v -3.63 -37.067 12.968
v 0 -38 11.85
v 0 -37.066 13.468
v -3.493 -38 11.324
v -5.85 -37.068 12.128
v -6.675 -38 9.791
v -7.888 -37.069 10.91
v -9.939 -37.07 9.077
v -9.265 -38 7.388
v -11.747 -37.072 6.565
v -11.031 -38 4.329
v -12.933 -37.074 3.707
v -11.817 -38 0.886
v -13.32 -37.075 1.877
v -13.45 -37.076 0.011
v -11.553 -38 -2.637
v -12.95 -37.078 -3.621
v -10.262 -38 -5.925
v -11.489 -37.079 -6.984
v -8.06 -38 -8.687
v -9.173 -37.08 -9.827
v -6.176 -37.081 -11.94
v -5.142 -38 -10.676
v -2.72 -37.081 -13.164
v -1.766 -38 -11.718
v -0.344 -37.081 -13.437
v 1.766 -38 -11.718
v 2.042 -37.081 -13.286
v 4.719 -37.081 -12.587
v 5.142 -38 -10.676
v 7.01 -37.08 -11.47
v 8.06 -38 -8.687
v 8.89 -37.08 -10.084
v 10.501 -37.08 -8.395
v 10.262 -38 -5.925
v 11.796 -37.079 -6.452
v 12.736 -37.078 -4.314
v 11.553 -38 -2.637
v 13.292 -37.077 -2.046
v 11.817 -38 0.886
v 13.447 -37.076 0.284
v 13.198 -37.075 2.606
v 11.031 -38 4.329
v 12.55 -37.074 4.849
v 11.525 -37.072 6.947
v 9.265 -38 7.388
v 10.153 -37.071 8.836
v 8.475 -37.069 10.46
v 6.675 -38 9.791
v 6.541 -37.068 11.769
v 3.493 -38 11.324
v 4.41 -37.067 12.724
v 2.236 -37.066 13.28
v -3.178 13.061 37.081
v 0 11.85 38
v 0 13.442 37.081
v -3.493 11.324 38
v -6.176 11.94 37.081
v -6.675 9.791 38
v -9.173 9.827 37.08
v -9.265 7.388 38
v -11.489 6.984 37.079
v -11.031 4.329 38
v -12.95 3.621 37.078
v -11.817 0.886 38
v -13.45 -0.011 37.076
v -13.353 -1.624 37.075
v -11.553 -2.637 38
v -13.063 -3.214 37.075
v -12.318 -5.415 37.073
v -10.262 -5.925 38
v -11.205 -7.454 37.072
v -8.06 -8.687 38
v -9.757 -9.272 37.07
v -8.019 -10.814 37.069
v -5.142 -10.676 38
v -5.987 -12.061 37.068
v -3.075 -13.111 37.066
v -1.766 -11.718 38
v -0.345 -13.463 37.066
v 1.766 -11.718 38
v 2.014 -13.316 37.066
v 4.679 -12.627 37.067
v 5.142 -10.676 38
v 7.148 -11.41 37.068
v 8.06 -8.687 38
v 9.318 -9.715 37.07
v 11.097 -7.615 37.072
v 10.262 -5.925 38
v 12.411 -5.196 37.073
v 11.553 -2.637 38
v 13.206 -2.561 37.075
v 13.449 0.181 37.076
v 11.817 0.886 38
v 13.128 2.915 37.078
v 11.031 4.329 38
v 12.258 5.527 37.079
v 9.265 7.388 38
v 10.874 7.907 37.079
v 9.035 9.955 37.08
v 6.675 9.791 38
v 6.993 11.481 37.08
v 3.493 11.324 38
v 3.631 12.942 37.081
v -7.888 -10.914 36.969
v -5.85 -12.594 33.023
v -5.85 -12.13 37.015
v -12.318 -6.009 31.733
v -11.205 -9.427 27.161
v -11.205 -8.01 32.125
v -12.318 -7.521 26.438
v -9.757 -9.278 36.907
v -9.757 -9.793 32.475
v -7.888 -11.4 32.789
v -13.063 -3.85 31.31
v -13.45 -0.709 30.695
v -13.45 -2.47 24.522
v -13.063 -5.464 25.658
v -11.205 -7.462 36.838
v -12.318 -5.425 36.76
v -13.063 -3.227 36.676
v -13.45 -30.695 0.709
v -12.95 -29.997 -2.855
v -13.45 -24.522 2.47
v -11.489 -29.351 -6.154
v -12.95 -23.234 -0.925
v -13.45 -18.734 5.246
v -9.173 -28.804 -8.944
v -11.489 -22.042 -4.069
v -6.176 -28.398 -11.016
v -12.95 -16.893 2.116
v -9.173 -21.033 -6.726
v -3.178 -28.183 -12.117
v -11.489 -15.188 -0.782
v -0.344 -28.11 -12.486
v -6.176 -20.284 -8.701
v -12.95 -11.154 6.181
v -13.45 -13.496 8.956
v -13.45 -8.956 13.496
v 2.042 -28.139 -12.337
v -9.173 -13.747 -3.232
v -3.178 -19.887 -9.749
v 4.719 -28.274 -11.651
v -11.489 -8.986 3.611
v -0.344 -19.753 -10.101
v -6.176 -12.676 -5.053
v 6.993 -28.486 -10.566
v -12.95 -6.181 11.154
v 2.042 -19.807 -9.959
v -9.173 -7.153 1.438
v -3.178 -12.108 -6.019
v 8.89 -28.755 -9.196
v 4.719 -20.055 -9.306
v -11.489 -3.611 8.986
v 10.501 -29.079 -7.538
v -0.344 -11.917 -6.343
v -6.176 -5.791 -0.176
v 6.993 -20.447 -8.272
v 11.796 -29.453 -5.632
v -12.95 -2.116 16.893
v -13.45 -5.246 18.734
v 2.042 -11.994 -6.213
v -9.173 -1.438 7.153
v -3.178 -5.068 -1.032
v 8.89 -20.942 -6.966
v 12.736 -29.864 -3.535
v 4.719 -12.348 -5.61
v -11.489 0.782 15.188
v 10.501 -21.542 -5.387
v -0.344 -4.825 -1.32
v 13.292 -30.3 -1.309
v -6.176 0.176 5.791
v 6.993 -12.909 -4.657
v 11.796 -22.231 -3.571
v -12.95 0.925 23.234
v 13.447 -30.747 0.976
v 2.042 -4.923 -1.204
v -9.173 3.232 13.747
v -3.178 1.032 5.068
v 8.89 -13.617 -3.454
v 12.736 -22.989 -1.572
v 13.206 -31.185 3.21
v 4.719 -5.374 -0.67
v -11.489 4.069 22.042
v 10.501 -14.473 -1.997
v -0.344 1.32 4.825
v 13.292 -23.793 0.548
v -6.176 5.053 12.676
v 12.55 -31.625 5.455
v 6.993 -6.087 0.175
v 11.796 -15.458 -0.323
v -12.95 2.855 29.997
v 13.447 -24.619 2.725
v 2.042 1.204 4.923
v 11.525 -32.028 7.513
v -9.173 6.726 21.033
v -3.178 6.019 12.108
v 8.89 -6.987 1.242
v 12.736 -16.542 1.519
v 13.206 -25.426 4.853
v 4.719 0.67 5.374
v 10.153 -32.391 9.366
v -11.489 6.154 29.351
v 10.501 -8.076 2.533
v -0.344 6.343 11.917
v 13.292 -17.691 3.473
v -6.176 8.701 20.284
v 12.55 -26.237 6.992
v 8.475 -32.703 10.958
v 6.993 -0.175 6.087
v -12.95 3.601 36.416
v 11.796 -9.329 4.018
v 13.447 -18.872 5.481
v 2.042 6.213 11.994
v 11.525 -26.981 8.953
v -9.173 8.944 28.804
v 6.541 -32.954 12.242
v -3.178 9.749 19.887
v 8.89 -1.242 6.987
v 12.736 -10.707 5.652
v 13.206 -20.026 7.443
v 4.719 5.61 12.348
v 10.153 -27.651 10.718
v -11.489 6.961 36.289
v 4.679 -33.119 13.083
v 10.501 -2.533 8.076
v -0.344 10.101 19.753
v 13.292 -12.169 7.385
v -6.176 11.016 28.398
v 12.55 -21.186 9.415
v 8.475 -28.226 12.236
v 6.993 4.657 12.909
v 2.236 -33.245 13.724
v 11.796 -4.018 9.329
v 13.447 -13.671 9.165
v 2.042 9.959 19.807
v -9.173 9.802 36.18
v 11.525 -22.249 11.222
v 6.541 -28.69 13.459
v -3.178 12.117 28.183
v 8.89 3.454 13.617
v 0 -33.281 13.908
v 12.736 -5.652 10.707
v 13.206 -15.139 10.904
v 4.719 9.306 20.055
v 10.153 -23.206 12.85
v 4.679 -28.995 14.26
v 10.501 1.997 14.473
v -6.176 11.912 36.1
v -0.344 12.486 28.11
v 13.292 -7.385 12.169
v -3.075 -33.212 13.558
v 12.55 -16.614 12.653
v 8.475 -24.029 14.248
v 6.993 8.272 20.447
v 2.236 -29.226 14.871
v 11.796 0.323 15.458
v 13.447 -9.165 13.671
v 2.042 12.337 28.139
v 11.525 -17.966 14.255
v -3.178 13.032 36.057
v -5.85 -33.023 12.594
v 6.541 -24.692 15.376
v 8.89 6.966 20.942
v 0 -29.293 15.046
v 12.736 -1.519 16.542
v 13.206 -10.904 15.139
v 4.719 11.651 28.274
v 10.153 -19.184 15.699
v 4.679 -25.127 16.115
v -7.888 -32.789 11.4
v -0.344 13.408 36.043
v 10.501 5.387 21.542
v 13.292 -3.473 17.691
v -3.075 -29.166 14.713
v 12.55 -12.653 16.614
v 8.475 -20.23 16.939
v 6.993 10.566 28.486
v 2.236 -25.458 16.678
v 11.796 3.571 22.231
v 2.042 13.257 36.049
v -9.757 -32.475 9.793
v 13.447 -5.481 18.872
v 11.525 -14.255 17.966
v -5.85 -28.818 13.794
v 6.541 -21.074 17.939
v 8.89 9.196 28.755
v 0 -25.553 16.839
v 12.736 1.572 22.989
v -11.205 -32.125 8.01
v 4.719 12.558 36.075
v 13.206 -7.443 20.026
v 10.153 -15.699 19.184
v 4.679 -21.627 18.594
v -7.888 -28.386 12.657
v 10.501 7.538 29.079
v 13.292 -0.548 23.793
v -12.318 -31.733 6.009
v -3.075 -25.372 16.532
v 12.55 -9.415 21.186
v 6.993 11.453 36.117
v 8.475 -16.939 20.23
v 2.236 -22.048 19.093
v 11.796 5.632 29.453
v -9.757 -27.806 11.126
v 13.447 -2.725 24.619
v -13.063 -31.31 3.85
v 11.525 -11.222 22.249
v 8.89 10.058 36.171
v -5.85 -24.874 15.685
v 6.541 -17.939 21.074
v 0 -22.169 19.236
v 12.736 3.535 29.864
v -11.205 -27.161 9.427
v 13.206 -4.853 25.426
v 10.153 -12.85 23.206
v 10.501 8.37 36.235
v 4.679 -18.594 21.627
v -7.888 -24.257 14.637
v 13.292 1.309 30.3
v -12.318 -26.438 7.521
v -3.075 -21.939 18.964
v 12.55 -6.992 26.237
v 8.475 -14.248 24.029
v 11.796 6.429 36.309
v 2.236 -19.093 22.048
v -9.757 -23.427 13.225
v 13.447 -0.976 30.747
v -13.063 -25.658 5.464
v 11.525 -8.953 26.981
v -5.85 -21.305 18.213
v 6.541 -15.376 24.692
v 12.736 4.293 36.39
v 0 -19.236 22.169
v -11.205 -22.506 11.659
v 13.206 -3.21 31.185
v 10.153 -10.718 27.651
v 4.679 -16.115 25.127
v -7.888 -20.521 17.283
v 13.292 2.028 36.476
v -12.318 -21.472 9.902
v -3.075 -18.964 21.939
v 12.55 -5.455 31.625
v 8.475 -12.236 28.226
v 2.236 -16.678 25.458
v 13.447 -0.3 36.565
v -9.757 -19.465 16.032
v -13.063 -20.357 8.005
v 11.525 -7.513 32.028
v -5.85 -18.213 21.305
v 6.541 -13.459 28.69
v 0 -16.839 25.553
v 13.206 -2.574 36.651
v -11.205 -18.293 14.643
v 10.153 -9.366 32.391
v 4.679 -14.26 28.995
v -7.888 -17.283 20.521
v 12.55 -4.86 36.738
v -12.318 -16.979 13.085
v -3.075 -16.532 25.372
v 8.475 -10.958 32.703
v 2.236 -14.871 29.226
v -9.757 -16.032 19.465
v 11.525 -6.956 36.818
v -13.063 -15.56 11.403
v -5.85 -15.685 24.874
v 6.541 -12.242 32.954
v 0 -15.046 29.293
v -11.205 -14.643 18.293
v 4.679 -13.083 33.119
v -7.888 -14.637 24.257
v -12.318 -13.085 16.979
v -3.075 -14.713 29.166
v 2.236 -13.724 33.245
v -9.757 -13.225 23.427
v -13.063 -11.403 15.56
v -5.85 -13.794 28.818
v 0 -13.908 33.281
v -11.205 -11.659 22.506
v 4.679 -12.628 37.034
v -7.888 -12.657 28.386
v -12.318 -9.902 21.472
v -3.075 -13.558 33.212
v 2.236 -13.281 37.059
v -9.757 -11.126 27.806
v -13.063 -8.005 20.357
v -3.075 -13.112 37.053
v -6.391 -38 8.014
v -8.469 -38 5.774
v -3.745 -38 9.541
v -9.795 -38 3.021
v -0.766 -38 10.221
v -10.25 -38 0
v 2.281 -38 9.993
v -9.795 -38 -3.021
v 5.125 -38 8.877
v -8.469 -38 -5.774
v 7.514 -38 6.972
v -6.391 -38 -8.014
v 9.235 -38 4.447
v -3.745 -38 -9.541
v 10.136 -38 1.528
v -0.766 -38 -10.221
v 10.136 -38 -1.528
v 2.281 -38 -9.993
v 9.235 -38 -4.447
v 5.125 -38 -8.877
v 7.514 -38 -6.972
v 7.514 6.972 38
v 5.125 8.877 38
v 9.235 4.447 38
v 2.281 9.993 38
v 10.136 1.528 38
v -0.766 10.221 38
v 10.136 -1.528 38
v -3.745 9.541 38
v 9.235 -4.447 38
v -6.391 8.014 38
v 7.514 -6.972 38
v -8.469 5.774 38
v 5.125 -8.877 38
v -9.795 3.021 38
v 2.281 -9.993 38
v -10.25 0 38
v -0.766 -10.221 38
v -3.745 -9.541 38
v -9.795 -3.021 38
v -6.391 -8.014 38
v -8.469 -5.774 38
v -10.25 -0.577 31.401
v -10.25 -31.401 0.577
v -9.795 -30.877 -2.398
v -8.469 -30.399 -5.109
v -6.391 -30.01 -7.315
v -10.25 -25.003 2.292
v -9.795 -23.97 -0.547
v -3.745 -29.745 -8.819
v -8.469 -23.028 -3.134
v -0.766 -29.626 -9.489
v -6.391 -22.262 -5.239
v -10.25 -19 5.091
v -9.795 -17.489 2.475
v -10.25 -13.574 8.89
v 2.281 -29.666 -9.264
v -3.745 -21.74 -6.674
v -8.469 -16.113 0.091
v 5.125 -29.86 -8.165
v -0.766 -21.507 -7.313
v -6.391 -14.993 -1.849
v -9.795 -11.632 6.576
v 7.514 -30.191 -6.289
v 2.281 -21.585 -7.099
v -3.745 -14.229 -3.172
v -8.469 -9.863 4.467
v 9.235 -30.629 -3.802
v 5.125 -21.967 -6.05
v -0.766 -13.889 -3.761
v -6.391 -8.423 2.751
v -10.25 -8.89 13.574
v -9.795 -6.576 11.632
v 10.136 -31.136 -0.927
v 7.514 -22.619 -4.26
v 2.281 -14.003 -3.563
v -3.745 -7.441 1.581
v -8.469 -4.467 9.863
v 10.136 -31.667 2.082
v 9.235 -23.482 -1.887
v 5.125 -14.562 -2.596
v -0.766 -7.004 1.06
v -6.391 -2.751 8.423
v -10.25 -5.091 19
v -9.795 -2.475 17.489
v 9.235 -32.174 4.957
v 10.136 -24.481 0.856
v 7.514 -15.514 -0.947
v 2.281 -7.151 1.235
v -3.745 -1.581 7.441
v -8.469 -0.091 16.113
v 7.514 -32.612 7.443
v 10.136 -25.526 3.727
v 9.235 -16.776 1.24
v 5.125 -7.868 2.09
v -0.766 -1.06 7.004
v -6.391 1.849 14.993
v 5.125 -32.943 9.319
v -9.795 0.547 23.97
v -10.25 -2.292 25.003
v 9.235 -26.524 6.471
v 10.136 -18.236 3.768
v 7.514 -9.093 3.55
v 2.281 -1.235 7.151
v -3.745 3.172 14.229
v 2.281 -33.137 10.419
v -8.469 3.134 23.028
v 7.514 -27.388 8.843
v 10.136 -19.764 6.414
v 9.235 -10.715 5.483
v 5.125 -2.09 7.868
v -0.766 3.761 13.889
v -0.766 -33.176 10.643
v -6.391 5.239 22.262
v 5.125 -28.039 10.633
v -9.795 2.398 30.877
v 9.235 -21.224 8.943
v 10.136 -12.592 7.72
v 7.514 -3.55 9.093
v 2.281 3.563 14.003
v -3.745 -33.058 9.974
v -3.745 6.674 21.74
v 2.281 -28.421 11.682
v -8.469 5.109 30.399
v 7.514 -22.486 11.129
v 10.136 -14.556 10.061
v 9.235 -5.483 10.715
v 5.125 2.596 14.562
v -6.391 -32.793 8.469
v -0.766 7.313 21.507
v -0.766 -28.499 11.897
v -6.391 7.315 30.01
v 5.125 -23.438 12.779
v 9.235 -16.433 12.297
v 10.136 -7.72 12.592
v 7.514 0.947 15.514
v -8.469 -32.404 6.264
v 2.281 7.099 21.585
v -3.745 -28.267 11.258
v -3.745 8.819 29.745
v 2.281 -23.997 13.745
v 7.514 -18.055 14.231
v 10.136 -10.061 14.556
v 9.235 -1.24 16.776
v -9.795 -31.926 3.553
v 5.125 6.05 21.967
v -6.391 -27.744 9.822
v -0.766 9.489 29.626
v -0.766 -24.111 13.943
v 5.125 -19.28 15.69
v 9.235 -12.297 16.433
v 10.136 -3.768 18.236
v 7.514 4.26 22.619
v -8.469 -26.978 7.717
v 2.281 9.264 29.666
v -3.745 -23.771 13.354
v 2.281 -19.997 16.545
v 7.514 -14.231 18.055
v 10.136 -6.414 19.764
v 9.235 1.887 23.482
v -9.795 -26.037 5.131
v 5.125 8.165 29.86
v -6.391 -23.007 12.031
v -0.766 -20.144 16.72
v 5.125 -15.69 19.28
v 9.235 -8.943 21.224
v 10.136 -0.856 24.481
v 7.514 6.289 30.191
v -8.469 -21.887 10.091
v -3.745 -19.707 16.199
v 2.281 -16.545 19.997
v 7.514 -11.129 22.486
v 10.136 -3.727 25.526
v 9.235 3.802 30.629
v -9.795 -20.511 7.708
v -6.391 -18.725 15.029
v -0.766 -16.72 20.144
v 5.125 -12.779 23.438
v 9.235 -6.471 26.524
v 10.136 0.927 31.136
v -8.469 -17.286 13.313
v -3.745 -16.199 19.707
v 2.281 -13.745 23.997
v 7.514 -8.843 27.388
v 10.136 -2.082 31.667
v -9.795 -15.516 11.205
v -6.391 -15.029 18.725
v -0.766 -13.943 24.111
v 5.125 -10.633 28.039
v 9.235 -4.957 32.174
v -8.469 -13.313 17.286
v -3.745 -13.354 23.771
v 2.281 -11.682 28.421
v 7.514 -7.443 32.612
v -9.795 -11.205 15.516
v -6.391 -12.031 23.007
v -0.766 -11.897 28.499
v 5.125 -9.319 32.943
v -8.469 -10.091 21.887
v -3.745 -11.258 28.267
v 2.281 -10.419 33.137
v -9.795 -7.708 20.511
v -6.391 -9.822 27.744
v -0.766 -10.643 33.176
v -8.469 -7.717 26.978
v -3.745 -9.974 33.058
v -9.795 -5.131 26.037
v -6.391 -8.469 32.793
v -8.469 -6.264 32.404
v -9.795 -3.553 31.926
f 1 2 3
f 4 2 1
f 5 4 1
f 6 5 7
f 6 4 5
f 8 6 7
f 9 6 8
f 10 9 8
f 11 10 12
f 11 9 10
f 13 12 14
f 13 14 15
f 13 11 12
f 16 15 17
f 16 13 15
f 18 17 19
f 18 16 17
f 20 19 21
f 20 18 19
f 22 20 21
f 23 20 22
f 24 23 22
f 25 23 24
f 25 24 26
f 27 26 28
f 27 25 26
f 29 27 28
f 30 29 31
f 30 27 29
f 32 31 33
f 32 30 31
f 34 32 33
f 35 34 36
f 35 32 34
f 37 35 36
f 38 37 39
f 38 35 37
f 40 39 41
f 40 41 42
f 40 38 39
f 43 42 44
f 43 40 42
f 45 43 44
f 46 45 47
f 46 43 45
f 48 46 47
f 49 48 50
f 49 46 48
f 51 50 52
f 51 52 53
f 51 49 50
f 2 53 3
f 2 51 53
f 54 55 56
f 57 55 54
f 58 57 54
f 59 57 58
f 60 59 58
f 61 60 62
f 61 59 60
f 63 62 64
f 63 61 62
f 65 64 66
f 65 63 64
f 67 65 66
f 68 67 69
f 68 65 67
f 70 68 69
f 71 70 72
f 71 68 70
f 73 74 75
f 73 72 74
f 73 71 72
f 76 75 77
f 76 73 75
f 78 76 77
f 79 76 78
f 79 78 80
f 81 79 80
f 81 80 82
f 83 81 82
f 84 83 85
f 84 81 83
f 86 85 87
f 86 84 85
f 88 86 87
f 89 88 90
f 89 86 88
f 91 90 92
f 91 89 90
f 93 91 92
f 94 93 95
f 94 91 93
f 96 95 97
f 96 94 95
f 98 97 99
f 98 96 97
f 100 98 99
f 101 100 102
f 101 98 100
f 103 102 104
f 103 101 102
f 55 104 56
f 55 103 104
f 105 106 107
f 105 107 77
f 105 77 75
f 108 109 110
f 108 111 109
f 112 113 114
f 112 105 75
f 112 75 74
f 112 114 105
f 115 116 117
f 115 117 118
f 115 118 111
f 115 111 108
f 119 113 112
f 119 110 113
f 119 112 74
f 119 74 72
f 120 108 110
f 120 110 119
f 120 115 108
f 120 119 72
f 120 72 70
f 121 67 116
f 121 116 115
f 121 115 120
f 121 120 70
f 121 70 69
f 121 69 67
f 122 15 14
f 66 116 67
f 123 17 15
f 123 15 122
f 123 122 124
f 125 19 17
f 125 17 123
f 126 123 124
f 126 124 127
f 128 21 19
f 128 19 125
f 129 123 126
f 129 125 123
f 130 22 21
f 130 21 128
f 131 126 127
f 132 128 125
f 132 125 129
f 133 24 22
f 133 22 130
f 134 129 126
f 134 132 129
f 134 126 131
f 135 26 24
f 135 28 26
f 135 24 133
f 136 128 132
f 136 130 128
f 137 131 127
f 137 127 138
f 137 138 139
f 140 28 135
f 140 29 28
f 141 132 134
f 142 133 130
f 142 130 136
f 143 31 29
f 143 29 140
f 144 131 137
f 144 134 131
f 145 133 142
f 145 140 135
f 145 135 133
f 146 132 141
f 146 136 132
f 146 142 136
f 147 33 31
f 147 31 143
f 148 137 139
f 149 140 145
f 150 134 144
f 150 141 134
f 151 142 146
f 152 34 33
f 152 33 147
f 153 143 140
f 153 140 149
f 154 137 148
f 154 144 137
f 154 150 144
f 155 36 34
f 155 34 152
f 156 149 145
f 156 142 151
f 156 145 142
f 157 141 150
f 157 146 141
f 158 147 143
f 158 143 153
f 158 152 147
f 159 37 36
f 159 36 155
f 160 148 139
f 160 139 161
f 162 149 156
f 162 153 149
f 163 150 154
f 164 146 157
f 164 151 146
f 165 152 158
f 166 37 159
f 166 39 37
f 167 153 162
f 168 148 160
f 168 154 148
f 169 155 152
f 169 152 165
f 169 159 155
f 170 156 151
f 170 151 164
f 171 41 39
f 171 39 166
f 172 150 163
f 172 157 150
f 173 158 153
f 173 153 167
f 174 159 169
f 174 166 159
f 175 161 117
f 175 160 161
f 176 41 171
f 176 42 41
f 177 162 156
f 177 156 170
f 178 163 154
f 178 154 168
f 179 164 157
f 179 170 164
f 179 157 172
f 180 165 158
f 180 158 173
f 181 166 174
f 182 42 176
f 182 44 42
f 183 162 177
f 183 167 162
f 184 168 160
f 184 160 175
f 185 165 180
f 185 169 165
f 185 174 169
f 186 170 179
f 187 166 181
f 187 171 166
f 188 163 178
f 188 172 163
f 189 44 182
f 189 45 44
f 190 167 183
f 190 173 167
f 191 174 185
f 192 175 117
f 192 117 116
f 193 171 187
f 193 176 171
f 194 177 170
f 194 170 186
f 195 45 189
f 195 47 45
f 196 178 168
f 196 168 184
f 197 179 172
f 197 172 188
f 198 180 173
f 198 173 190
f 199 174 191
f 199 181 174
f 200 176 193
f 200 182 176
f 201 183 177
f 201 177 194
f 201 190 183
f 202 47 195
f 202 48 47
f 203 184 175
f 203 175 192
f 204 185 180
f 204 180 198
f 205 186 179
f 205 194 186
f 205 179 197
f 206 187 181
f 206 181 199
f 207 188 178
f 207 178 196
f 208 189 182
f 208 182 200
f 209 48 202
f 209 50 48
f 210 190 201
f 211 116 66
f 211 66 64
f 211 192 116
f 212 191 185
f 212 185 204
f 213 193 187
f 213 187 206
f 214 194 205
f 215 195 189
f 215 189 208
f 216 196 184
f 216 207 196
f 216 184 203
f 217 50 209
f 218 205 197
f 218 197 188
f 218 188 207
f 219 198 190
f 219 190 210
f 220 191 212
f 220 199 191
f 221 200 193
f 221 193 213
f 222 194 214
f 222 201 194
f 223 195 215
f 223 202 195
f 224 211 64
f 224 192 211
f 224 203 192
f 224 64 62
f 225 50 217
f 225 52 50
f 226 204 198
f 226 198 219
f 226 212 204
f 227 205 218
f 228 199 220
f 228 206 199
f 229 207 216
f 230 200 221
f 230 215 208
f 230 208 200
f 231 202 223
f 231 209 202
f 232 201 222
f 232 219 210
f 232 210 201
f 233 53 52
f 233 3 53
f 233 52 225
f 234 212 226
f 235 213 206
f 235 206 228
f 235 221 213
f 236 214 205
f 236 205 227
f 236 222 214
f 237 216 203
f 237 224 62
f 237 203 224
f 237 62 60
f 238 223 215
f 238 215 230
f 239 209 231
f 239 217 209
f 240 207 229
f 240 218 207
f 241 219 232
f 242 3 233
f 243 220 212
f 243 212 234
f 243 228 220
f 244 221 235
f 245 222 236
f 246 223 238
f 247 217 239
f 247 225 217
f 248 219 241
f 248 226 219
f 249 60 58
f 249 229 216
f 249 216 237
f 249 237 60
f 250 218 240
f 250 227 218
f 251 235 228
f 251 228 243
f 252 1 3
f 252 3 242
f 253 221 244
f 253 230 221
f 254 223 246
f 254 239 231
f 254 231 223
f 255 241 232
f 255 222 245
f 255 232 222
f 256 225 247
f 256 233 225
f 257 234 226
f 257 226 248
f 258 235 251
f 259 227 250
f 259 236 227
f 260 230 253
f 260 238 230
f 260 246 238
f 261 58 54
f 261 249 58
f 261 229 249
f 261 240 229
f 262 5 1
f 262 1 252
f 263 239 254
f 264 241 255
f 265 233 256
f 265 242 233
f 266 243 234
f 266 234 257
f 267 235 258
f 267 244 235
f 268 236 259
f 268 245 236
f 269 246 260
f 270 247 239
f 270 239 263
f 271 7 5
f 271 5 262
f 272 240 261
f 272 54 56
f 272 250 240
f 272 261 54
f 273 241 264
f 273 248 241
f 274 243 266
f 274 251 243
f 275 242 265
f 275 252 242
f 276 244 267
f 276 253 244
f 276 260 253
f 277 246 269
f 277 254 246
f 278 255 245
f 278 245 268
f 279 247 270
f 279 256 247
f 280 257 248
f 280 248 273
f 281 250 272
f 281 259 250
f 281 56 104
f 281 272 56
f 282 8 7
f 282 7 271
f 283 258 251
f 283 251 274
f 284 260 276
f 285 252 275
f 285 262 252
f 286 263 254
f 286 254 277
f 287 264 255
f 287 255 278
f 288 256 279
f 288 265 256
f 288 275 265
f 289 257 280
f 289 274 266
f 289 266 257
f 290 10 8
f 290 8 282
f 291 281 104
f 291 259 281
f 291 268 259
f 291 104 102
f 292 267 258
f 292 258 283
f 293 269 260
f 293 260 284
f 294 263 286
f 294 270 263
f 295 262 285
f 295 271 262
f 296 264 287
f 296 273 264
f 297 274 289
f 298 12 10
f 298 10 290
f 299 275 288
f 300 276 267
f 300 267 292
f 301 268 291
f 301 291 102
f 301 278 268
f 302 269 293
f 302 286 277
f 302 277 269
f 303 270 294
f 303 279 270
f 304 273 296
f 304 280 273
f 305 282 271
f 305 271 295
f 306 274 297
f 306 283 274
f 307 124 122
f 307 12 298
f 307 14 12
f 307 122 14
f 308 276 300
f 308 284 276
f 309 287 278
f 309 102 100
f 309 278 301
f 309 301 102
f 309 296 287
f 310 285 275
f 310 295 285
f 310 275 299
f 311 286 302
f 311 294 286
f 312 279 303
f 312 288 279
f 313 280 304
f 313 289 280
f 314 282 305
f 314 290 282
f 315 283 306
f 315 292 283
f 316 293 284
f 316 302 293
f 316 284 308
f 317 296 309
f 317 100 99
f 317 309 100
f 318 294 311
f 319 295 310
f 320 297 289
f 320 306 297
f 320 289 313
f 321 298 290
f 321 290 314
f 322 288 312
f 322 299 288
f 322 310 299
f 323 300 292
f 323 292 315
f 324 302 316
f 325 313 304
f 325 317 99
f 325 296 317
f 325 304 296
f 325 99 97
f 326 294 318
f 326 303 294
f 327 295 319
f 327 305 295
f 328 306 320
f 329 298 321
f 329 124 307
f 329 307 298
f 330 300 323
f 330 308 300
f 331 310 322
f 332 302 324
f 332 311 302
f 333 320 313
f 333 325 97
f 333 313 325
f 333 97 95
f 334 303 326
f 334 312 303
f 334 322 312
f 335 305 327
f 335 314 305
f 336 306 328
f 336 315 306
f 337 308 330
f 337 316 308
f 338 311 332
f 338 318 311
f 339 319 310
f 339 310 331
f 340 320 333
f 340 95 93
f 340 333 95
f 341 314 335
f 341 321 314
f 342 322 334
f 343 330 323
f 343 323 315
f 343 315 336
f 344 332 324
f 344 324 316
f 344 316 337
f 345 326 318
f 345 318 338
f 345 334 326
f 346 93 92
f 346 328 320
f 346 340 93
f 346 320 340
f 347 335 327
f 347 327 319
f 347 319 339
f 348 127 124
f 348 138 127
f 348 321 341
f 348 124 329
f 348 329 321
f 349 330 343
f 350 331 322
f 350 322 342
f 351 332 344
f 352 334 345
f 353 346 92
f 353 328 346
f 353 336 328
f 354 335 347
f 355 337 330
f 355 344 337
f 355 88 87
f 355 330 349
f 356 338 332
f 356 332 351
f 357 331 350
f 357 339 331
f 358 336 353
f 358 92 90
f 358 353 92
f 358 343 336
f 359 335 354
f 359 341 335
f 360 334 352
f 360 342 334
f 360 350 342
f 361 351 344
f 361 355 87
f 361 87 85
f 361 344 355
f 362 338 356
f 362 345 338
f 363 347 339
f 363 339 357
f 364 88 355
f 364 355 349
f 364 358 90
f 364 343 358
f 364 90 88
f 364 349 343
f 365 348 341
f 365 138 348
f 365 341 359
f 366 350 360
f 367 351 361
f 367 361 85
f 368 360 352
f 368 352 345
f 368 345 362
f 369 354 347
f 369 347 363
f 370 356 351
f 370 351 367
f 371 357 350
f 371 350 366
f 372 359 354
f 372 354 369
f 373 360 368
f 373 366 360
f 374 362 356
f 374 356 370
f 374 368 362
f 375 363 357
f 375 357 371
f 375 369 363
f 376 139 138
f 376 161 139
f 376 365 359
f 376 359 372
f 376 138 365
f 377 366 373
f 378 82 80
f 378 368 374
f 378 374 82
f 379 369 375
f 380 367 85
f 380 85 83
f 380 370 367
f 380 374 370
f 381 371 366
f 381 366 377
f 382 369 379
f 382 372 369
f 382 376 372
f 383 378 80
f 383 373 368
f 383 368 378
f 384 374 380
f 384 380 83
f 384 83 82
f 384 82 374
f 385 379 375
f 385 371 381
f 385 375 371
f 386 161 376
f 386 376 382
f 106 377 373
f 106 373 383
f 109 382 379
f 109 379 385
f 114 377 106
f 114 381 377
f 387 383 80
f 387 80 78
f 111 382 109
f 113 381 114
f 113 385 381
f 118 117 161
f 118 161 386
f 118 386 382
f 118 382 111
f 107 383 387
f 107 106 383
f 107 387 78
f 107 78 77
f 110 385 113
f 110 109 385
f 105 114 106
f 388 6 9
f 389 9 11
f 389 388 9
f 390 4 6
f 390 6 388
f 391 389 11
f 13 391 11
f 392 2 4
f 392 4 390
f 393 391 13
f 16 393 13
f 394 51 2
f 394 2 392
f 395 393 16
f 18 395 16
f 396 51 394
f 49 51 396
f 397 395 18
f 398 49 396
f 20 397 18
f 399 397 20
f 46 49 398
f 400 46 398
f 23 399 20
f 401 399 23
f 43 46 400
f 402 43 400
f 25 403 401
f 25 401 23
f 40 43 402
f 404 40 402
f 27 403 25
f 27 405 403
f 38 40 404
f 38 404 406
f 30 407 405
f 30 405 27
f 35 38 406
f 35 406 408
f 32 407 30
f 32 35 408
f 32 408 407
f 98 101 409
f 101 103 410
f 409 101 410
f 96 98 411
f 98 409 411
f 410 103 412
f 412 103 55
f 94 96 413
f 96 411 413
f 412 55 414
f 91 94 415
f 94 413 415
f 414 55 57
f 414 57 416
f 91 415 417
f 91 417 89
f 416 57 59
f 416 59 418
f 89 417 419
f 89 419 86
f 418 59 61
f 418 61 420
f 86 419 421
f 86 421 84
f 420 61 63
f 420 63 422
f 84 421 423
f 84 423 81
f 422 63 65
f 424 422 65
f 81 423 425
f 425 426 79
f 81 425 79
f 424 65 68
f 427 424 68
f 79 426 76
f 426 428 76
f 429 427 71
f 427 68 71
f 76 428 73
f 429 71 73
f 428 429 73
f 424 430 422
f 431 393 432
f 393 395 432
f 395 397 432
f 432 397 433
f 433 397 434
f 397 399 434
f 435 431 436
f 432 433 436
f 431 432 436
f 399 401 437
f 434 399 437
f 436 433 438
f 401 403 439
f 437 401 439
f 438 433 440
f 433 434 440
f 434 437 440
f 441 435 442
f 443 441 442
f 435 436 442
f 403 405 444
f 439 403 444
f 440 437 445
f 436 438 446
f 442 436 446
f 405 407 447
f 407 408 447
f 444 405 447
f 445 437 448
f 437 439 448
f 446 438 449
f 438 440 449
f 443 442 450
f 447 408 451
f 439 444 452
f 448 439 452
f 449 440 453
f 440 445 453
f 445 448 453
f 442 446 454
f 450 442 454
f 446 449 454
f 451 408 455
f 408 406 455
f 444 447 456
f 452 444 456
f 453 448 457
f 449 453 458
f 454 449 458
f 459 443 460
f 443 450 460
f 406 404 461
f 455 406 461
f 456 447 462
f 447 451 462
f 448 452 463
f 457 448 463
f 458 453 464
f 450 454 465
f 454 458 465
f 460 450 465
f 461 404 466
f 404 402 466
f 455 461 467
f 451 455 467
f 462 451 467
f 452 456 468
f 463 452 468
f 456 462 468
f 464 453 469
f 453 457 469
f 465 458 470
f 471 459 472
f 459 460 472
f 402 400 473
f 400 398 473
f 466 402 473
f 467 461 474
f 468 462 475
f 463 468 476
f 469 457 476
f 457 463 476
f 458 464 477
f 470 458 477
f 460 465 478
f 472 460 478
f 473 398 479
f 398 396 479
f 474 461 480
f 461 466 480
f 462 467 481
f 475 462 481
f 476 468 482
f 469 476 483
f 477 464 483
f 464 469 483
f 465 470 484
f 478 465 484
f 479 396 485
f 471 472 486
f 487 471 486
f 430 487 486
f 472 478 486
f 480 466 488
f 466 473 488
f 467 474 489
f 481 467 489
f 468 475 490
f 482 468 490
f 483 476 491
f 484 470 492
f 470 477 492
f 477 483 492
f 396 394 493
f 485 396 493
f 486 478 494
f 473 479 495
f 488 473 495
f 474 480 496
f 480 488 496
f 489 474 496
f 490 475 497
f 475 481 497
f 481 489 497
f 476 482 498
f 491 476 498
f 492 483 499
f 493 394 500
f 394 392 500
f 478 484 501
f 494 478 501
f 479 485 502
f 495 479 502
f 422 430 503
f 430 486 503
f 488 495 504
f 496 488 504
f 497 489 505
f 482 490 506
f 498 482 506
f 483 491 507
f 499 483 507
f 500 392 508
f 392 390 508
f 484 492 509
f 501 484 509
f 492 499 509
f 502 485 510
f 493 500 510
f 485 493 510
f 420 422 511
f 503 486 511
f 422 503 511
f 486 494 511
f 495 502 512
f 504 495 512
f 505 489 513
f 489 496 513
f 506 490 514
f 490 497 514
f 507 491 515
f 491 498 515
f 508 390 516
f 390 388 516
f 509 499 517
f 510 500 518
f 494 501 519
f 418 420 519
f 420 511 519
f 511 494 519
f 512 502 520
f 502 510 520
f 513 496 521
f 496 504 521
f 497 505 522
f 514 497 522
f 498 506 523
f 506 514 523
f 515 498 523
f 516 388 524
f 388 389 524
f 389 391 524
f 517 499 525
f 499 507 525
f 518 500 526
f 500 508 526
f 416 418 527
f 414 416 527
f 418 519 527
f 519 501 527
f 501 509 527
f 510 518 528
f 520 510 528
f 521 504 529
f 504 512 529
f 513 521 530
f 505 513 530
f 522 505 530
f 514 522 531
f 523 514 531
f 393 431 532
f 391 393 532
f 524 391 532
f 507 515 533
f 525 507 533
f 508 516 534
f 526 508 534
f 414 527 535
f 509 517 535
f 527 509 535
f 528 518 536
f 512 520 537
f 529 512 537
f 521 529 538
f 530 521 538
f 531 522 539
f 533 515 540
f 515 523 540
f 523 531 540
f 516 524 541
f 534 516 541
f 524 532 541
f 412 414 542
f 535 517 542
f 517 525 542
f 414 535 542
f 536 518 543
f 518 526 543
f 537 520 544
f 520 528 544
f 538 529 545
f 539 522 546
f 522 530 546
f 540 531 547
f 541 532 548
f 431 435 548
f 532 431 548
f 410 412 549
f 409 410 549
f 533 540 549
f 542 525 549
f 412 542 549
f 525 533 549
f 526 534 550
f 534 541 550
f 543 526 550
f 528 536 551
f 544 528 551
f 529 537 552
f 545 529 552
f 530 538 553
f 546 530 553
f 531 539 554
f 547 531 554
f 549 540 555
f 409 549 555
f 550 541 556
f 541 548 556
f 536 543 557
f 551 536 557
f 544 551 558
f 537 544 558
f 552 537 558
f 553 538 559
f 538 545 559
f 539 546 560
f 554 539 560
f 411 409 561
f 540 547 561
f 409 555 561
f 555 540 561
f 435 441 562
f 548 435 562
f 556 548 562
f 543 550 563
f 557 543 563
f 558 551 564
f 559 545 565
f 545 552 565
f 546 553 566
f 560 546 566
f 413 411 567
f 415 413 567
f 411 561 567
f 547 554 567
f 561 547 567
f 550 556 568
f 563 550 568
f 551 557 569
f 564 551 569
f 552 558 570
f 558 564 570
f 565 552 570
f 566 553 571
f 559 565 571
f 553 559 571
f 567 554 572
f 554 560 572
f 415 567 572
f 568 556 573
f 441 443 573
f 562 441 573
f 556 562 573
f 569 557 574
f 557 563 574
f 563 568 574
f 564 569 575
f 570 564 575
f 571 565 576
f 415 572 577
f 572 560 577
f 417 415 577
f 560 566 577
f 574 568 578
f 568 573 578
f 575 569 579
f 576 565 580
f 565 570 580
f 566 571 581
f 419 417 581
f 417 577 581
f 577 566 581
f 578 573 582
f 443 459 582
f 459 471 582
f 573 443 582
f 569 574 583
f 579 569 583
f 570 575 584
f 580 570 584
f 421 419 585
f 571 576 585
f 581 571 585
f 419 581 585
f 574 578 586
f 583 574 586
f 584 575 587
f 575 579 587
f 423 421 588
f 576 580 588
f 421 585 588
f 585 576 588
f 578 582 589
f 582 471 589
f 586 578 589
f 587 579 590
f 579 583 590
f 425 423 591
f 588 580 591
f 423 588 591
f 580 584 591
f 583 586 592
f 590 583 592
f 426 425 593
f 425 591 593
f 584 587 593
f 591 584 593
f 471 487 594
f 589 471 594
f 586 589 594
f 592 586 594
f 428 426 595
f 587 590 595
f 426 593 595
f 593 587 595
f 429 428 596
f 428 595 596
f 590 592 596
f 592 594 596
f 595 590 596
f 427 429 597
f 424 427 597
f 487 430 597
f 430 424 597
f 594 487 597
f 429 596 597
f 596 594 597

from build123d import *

# Parameters (mm, degrees)
ROHR_R   = 13.45
ROHR_R_2 = 10.25


with BuildPart() as part:
    # Bogen: sweep along a path in Pfad
    with BuildLine(Plane(origin=(0, 0, 0), x_dir=(0, 0, -1), z_dir=(1, 0, 0))) as bogen_path:
        ThreePointArc((0, -38), (-11.129942315, -11.129942315), (-38, 0))
    # Rohr → Bogen (sweep)
    with BuildSketch(Plane(origin=(0, -38, 0), x_dir=(-1, 0, 0), z_dir=(0, -1, 0))):
        Circle(ROHR_R)
        Circle(ROHR_R_2, mode=Mode.SUBTRACT)
    sweep(path=bogen_path.line)

    # SkzFase one side → Fase1 (revolve, cut)
    with BuildSketch(Plane(origin=(0, 0, 0), x_dir=(0, 0, -1), z_dir=(1, 0, 0)), mode=Mode.PRIVATE) as fase1_sk:
        Polygon((15.45, -35.921539031), (11.85, -38), (15.45, -38), align=None)
    revolve(fase1_sk.sketch.rotate(Axis((0, 0, 0), (0, -1, 0)), 180), axis=Axis((0, 0, 0), (0, -1, 0)), mode=Mode.SUBTRACT)  # turned: the seam where the file's is

    # Skizze1_3 → Fase2 (revolve, cut)
    with BuildSketch(Plane(origin=(0, 0, 0), x_dir=(0, 0, -1), z_dir=(1, 0, 0))):
        Polygon((-35.921539031, 15.45), (-38, 11.85), (-38, 15.45), align=None)
    revolve(axis=Axis((0, 0, 0), (0, 0, 1)), mode=Mode.SUBTRACT)


solid = part.part
